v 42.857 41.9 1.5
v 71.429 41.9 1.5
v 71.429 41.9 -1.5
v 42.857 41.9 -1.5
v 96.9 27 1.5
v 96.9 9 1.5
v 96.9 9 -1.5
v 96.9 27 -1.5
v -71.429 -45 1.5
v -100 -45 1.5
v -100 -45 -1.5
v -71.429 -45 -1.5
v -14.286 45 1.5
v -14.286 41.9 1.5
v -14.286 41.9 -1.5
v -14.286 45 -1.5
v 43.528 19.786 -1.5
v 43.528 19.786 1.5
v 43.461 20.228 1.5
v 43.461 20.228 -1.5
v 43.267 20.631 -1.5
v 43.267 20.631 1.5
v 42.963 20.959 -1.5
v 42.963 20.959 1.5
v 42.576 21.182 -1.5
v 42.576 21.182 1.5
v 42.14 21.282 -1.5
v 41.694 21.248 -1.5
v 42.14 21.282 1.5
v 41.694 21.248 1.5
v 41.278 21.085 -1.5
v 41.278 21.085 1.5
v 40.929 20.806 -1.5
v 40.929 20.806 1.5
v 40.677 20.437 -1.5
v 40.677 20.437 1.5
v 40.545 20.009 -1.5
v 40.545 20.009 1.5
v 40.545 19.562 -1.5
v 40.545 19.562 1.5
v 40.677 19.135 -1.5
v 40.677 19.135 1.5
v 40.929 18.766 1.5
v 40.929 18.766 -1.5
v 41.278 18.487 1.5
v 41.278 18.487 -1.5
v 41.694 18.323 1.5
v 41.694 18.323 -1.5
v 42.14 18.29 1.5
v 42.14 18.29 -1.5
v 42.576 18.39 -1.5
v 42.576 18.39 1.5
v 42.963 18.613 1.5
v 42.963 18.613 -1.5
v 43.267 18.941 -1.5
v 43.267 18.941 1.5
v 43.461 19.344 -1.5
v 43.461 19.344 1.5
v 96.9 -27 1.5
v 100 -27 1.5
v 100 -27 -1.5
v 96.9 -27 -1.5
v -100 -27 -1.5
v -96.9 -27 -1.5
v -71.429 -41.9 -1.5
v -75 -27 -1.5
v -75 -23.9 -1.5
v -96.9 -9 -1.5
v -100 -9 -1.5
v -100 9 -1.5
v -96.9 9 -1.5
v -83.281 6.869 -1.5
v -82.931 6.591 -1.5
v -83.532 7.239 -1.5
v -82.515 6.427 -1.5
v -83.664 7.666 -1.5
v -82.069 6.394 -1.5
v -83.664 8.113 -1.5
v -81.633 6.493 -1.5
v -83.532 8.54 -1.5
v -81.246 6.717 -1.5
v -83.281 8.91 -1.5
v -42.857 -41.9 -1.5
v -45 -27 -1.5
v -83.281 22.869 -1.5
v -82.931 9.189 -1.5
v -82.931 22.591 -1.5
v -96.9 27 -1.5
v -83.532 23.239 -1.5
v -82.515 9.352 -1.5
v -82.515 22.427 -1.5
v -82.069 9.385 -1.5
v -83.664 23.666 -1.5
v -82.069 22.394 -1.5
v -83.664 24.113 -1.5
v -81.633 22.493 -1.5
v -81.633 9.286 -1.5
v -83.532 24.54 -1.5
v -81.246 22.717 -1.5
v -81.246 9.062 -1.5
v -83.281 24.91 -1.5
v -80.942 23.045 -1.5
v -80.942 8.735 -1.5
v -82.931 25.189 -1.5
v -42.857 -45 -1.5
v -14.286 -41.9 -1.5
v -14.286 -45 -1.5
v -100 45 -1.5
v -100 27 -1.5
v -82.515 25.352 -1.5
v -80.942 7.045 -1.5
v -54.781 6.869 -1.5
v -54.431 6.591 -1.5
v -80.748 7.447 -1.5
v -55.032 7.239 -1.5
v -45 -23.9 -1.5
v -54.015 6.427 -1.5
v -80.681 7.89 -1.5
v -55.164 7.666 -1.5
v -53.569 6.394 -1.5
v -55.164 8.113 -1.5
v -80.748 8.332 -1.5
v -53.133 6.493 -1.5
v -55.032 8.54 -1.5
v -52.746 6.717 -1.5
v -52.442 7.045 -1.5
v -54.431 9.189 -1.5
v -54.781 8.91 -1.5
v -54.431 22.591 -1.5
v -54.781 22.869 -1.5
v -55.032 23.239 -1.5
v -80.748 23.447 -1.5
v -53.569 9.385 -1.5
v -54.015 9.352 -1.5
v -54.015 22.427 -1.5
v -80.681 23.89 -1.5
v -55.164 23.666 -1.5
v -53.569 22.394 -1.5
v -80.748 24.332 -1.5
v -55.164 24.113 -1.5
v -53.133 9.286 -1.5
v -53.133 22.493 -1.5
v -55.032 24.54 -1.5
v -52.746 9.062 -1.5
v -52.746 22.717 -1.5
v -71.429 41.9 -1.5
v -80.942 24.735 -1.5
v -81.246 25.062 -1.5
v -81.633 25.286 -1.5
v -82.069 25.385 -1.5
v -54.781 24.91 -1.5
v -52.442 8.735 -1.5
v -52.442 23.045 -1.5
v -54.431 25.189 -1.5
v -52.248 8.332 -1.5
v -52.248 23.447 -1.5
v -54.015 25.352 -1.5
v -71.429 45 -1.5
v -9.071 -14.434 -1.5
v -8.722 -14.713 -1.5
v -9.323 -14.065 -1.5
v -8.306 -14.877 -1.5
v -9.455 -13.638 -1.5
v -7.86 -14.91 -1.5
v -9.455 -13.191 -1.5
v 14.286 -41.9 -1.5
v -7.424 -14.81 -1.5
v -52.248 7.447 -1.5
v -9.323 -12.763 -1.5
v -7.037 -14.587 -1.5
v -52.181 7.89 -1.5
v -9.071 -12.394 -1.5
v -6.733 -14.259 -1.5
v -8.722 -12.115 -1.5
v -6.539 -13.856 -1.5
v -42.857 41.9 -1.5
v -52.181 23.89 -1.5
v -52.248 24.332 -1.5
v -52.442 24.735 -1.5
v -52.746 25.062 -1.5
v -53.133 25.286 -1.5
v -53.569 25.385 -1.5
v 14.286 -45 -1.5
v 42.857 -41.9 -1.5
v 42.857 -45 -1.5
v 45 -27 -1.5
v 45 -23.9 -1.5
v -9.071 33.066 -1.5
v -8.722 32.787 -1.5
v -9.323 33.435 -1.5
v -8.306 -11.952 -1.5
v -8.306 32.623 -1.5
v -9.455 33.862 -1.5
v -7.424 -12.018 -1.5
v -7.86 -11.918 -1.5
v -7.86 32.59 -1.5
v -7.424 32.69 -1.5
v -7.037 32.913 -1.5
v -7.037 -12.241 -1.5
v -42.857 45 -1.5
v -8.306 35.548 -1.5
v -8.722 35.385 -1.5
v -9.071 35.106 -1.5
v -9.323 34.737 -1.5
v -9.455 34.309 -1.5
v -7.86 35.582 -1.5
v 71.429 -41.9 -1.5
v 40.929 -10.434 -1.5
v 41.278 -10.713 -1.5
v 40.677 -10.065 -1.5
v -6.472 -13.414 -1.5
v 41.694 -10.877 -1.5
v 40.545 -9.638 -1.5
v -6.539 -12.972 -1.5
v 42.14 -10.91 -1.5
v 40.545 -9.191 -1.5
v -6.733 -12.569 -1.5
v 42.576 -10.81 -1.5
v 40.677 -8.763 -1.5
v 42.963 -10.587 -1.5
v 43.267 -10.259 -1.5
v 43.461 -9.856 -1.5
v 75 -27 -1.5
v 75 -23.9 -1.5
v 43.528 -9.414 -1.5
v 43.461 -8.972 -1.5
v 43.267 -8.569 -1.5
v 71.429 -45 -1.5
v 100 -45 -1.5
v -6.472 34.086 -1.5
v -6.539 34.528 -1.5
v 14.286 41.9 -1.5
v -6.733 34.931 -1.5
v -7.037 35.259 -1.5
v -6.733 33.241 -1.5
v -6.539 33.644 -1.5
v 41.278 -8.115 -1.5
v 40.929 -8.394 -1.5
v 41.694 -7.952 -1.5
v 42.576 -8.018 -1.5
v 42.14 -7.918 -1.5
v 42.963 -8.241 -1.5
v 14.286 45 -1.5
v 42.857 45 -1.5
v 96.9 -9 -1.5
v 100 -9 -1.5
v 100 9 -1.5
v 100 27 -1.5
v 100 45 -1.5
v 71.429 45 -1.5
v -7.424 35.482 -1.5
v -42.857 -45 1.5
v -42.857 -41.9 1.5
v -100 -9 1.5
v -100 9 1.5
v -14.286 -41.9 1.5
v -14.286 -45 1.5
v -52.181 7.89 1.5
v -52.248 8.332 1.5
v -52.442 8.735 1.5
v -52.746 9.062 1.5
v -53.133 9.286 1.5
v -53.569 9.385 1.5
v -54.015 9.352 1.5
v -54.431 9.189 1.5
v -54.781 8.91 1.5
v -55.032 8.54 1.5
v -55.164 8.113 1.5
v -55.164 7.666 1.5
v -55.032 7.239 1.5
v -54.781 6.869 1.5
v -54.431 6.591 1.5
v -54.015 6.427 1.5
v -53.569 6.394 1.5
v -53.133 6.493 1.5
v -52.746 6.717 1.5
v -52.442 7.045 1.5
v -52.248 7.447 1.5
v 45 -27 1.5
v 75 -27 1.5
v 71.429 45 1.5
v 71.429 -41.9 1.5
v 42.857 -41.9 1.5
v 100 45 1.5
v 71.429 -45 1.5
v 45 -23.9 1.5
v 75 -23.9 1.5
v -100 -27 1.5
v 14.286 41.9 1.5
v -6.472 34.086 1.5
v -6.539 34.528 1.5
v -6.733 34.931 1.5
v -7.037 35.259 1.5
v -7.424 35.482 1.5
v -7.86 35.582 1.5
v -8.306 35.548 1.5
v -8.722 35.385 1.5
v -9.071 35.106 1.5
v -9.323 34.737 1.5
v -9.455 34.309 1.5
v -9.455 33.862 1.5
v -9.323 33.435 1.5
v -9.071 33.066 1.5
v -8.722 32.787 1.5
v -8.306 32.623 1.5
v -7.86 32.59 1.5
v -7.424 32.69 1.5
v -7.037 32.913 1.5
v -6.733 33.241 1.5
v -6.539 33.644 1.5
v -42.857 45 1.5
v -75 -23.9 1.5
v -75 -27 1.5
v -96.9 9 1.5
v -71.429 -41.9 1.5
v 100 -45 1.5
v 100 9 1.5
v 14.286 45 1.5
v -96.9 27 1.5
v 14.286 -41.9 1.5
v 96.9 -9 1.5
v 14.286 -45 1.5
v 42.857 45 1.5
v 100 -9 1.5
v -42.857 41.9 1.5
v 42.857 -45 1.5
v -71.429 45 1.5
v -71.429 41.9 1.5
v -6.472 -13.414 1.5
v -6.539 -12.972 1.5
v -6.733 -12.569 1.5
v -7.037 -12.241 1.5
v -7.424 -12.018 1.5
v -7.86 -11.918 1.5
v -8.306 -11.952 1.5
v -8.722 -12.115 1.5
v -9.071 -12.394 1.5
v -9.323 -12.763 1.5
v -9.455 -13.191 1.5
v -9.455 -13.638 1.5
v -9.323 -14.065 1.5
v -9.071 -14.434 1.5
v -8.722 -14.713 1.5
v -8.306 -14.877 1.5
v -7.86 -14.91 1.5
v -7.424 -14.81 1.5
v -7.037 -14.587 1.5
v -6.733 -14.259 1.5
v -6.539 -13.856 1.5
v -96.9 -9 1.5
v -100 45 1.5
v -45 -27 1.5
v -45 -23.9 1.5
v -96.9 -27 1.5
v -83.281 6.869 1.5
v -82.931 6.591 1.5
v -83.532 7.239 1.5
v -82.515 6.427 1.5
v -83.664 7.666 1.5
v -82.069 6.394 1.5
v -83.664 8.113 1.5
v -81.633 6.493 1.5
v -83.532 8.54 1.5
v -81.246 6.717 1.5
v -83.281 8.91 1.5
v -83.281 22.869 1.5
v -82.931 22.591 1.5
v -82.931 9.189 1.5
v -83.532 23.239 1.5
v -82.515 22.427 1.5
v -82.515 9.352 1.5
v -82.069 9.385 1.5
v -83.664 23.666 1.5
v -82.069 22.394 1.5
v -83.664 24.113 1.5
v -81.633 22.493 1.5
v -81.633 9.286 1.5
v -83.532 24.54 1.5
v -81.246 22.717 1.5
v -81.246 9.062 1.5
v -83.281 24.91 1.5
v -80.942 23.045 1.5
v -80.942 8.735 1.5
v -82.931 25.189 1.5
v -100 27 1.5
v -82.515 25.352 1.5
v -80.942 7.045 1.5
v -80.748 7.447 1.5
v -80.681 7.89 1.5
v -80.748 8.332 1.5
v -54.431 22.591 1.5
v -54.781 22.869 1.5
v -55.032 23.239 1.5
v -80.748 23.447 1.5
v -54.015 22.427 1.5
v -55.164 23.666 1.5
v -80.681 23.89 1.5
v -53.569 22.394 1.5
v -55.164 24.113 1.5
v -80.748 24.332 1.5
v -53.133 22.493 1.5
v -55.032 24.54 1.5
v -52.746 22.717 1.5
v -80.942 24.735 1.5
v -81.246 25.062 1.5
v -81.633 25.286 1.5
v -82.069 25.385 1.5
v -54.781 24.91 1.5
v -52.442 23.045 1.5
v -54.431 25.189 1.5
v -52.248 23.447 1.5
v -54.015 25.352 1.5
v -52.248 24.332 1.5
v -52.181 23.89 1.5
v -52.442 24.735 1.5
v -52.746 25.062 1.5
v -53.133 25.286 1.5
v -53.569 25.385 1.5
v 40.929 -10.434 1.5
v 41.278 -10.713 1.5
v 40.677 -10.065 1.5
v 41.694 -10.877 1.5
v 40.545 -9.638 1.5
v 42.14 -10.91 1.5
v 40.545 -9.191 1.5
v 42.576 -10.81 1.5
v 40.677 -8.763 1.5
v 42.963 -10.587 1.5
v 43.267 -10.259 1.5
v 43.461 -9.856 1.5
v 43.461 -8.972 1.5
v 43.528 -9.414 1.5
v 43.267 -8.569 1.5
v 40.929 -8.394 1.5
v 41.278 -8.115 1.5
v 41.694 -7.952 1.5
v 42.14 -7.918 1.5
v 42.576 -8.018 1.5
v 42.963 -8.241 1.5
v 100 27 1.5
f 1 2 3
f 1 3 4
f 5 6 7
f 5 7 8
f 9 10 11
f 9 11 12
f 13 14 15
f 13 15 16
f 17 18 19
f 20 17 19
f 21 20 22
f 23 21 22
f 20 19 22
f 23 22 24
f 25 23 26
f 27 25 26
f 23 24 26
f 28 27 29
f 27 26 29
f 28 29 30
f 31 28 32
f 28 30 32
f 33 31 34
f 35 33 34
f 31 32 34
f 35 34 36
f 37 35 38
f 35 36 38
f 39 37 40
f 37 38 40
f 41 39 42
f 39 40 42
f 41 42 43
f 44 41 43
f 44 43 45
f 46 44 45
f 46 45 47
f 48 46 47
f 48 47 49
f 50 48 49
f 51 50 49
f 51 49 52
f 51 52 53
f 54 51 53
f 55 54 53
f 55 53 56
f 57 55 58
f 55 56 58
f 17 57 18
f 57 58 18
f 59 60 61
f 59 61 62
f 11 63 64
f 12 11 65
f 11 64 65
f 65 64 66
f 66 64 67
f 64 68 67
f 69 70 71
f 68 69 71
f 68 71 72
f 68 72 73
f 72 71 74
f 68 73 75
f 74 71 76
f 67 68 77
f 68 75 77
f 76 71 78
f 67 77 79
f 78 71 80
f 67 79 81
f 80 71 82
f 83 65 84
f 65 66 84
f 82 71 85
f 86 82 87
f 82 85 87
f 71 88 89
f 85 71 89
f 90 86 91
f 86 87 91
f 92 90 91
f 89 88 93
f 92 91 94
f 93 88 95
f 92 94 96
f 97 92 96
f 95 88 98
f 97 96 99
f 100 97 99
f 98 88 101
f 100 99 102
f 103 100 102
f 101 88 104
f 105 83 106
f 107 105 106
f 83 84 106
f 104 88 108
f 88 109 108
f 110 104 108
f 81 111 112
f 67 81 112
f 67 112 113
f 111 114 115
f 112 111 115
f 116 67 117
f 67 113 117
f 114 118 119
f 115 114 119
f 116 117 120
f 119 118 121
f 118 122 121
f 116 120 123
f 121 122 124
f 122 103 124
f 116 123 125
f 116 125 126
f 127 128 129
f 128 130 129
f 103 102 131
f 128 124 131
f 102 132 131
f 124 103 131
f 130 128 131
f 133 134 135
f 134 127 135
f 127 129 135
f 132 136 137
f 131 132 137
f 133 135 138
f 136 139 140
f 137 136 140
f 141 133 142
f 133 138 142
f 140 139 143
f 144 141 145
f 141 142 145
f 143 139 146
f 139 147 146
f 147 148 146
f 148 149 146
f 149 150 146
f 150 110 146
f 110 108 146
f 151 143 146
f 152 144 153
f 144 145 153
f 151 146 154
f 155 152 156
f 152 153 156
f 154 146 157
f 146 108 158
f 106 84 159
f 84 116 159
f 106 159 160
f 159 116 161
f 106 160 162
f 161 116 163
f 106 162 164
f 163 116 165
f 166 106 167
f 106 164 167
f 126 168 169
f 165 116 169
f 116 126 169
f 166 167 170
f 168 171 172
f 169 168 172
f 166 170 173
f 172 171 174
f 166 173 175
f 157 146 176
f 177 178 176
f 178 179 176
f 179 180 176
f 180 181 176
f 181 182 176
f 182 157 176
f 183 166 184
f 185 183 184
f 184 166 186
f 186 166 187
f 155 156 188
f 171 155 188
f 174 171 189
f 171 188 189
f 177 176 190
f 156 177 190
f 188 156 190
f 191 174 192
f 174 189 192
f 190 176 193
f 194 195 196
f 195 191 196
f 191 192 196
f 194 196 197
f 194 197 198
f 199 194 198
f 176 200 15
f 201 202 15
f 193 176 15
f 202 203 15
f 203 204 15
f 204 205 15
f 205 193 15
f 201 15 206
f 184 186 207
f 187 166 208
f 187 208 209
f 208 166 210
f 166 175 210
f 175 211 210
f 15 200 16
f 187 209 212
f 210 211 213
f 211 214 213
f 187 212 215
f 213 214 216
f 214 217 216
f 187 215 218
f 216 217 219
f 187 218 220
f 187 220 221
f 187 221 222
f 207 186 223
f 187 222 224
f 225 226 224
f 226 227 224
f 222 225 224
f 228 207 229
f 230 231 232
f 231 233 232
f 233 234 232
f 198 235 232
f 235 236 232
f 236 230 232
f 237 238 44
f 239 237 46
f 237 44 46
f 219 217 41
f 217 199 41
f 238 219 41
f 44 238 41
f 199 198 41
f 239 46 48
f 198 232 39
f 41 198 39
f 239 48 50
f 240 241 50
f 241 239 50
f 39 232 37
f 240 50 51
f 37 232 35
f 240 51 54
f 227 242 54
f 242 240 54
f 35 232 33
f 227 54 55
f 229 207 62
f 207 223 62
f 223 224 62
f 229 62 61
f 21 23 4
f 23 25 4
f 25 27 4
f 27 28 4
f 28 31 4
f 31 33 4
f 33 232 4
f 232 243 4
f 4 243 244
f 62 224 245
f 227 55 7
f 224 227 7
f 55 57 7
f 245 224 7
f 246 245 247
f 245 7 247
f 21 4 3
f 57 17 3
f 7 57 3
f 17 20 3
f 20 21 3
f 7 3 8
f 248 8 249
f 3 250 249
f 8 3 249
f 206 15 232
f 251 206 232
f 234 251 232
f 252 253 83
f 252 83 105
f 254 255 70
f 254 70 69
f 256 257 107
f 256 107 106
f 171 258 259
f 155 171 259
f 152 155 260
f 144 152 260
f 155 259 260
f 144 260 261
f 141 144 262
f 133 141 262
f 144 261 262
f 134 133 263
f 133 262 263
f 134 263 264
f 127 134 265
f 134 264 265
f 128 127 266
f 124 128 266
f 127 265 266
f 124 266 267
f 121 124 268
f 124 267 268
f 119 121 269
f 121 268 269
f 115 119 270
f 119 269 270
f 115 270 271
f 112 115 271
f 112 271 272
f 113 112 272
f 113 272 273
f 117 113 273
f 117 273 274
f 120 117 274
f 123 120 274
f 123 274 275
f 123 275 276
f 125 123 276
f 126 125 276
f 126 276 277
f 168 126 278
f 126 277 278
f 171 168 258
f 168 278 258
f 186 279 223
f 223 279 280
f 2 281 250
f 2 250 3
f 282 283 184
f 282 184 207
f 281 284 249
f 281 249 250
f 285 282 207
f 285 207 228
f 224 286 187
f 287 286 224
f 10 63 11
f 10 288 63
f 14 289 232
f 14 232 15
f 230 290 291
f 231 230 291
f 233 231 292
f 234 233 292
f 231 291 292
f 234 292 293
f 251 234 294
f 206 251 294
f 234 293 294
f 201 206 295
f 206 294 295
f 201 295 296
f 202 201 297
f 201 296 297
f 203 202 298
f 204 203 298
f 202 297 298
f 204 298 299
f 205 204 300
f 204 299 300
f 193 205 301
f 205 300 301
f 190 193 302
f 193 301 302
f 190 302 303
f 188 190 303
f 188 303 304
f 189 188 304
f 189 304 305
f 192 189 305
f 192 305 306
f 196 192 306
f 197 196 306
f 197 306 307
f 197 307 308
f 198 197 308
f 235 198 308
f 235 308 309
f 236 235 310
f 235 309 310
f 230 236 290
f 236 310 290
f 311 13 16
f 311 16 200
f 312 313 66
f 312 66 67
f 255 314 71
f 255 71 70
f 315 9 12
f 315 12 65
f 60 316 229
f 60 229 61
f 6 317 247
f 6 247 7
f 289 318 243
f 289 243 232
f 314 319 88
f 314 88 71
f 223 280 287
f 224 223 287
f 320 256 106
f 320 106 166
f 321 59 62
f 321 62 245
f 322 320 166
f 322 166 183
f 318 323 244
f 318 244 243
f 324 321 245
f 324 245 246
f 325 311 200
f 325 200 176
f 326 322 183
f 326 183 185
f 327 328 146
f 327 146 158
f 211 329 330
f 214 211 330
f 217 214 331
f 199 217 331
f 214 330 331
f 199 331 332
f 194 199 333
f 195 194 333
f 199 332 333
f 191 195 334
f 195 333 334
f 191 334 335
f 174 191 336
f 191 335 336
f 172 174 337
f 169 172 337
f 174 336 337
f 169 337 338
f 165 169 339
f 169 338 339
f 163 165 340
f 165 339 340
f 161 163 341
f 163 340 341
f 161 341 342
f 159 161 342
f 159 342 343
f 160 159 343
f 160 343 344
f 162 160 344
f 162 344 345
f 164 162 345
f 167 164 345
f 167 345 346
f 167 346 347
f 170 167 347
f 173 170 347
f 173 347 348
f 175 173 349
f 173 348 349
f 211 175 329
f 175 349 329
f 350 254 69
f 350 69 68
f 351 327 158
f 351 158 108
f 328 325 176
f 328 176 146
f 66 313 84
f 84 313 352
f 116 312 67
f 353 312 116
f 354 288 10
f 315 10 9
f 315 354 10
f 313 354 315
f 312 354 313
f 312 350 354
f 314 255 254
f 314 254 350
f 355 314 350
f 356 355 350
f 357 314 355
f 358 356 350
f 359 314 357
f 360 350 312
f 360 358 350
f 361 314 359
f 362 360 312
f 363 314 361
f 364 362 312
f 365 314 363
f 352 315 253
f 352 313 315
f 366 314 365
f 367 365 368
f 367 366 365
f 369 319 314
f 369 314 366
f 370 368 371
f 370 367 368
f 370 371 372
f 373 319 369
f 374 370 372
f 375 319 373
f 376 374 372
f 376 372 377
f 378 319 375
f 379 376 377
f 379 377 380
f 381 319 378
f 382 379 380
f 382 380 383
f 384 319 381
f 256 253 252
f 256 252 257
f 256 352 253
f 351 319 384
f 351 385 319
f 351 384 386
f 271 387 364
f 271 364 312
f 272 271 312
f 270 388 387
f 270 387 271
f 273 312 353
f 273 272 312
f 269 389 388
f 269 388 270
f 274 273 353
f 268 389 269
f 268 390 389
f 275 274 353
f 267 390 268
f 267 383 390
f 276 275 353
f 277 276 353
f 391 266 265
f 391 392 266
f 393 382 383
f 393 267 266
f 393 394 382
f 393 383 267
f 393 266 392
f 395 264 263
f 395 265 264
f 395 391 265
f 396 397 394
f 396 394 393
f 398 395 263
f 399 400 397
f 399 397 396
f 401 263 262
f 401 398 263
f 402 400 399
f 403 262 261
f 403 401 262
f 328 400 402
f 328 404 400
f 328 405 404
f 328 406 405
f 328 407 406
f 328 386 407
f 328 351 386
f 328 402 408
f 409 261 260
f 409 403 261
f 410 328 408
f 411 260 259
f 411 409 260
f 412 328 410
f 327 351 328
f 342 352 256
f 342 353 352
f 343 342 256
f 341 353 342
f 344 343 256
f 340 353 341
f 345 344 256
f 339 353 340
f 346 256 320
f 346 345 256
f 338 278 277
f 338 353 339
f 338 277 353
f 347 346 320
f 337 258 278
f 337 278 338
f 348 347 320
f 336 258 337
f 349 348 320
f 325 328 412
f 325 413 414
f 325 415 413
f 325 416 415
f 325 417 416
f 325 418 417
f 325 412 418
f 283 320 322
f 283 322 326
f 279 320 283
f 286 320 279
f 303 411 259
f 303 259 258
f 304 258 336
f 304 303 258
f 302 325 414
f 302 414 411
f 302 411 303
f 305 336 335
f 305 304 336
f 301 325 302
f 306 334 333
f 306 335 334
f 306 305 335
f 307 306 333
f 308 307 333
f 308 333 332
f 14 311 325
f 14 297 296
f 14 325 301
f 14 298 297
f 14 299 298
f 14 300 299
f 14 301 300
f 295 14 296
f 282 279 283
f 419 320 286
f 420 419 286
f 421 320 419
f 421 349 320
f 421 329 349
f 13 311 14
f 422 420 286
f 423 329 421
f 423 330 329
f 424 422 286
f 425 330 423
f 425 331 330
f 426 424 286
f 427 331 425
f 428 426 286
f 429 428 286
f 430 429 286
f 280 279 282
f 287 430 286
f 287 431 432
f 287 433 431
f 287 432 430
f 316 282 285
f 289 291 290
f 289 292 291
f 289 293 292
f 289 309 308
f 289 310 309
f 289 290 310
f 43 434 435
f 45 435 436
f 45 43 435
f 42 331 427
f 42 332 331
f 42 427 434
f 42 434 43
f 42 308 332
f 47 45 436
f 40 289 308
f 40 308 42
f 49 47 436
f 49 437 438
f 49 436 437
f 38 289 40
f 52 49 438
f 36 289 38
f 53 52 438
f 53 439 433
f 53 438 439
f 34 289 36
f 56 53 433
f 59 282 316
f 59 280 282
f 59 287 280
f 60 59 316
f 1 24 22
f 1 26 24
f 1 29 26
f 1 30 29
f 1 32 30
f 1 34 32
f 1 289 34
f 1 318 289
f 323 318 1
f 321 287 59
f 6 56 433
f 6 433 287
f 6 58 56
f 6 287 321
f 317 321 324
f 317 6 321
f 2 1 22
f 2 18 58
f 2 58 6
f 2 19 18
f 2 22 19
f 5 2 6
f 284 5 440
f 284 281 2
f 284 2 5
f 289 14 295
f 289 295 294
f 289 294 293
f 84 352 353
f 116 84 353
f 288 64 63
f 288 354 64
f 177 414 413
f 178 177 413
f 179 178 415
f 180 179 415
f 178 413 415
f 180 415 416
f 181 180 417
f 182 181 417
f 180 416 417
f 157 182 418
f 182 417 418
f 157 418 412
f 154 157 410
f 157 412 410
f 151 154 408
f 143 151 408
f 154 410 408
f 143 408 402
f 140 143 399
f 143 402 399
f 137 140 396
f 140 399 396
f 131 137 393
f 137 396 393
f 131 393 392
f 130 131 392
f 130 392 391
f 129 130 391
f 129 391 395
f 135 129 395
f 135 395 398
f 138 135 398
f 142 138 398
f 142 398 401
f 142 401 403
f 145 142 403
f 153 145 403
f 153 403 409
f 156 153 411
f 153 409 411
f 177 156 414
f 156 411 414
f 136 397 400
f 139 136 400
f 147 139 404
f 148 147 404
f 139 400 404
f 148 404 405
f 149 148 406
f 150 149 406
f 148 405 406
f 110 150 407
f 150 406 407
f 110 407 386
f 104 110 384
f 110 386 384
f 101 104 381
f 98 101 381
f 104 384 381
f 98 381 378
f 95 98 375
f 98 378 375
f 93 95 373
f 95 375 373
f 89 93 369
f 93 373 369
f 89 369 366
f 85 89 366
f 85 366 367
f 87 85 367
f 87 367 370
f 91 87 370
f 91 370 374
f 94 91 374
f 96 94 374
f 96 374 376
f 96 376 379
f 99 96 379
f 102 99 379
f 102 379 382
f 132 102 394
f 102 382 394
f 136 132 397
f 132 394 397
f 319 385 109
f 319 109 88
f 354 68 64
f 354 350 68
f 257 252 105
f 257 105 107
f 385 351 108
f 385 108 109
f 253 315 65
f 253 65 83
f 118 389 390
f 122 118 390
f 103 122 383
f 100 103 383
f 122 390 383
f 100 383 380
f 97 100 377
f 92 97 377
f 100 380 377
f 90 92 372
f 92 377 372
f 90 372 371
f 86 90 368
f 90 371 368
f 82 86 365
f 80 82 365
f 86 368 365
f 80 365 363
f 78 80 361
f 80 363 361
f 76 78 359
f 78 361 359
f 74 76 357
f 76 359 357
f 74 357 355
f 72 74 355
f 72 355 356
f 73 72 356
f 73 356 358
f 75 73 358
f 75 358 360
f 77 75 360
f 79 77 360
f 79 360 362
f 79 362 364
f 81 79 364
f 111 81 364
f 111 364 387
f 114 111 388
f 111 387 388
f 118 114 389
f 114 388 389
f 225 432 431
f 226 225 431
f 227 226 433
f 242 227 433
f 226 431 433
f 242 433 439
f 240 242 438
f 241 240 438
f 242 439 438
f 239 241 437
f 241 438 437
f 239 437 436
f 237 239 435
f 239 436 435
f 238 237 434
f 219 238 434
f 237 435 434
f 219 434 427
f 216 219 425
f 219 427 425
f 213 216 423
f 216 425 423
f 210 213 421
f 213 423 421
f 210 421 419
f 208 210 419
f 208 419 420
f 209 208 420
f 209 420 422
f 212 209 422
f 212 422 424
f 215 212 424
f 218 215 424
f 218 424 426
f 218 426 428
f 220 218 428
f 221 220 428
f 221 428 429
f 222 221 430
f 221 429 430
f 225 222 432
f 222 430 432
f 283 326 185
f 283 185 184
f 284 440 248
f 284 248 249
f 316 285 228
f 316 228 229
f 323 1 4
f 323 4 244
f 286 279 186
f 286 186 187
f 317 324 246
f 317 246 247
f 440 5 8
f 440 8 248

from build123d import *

# Parameters (mm, degrees)
SALIENTE_EXTRUIR1_DEPTH = 1.5
CROQUIS2_W              = 30
CROQUIS2_H              = 3.1
CORTAR_EXTRUIR1_DEPTH   = 10
CROQUIS3_R              = 1.5
CORTAR_EXTRUIR2_DEPTH   = 3
CROQUIS6_R              = 1.5
CORTAR_EXTRUIR3_DEPTH   = 3
CROQUIS8_R              = 1.5
CORTAR_EXTRUIR4_DEPTH   = 3


with BuildPart() as part:
    # Croquis1 → Saliente-Extruir1 (new, symmetric)
    with BuildSketch(Plane.XY):
        Polygon((-100, -27), (-100, -45), (-71.428571429, -45), (-71.428571429, -41.9), (-42.857142857, -41.9), (-42.857142857, -45), (-14.285714286, -45), (-14.285714286, -41.9), (14.285714286, -41.9), (14.285714286, -45), (42.857142857, -45), (42.857142857, -41.9), (71.428571429, -41.9), (71.428571429, -45), (100, -45), (100, -27), (96.9, -27), (96.9, -9), (100, -9), (100, 9), (96.9, 9), (96.9, 27), (100, 27), (100, 45), (71.428571429, 45), (71.428571429, 41.9), (42.857142857, 41.9), (42.857142857, 45), (14.285714286, 45), (14.285714286, 41.9), (-14.285714286, 41.9), (-14.285714286, 45), (-42.857142857, 45), (-42.857142857, 41.9), (-71.428571429, 41.9), (-71.428571429, 45), (-100, 45), (-100, 27), (-96.9, 27), (-96.9, 9), (-100, 9), (-100, -9), (-96.9, -9), (-96.9, -27), align=None)
    extrude(amount=SALIENTE_EXTRUIR1_DEPTH, both=True)

    # Croquis2 → Cortar-Extruir1 (cut)
    with BuildSketch(Plane.XY.offset(1.5)):
        with Locations((-60, -25.45)):
            Rectangle(CROQUIS2_W, CROQUIS2_H)
        with Locations((60, -25.45)):
            Rectangle(CROQUIS2_W, CROQUIS2_H)
    extrude(amount=-CORTAR_EXTRUIR1_DEPTH, mode=Mode.SUBTRACT)

    # Croquis3 → Cortar-Extruir2 (cut)
    with BuildSketch(Plane.XY.offset(1.5)):
        with Locations((-82.180986704, 23.889608573)):
            Circle(CROQUIS3_R)
        with Locations((-53.680986704, 23.889608573)):
            Circle(CROQUIS3_R)
        with Locations((-53.680986704, 7.889608573)):
            Circle(CROQUIS3_R)
        with Locations((-82.180986704, 7.889608573)):
            Circle(CROQUIS3_R)
    extrude(amount=-CORTAR_EXTRUIR2_DEPTH, mode=Mode.SUBTRACT)

    # Croquis6 → Cortar-Extruir3 (cut)
    with BuildSketch(Plane.XY.offset(1.5)):
        with Locations((-7.971882846, 34.085861189)):
            Circle(CROQUIS6_R)
        with Locations((-7.971882846, -13.414138811)):
            Circle(CROQUIS6_R)
    extrude(amount=-CORTAR_EXTRUIR3_DEPTH, mode=Mode.SUBTRACT)

    # Croquis8 → Cortar-Extruir4 (cut)
    with BuildSketch(Plane.XY.offset(1.5)):
        with Locations((42.028117154, 19.785861189)):
            Circle(CROQUIS8_R)
        with Locations((42.028117154, -9.414138811)):
            Circle(CROQUIS8_R)
    extrude(amount=-CORTAR_EXTRUIR4_DEPTH, mode=Mode.SUBTRACT)


solid = part.part
